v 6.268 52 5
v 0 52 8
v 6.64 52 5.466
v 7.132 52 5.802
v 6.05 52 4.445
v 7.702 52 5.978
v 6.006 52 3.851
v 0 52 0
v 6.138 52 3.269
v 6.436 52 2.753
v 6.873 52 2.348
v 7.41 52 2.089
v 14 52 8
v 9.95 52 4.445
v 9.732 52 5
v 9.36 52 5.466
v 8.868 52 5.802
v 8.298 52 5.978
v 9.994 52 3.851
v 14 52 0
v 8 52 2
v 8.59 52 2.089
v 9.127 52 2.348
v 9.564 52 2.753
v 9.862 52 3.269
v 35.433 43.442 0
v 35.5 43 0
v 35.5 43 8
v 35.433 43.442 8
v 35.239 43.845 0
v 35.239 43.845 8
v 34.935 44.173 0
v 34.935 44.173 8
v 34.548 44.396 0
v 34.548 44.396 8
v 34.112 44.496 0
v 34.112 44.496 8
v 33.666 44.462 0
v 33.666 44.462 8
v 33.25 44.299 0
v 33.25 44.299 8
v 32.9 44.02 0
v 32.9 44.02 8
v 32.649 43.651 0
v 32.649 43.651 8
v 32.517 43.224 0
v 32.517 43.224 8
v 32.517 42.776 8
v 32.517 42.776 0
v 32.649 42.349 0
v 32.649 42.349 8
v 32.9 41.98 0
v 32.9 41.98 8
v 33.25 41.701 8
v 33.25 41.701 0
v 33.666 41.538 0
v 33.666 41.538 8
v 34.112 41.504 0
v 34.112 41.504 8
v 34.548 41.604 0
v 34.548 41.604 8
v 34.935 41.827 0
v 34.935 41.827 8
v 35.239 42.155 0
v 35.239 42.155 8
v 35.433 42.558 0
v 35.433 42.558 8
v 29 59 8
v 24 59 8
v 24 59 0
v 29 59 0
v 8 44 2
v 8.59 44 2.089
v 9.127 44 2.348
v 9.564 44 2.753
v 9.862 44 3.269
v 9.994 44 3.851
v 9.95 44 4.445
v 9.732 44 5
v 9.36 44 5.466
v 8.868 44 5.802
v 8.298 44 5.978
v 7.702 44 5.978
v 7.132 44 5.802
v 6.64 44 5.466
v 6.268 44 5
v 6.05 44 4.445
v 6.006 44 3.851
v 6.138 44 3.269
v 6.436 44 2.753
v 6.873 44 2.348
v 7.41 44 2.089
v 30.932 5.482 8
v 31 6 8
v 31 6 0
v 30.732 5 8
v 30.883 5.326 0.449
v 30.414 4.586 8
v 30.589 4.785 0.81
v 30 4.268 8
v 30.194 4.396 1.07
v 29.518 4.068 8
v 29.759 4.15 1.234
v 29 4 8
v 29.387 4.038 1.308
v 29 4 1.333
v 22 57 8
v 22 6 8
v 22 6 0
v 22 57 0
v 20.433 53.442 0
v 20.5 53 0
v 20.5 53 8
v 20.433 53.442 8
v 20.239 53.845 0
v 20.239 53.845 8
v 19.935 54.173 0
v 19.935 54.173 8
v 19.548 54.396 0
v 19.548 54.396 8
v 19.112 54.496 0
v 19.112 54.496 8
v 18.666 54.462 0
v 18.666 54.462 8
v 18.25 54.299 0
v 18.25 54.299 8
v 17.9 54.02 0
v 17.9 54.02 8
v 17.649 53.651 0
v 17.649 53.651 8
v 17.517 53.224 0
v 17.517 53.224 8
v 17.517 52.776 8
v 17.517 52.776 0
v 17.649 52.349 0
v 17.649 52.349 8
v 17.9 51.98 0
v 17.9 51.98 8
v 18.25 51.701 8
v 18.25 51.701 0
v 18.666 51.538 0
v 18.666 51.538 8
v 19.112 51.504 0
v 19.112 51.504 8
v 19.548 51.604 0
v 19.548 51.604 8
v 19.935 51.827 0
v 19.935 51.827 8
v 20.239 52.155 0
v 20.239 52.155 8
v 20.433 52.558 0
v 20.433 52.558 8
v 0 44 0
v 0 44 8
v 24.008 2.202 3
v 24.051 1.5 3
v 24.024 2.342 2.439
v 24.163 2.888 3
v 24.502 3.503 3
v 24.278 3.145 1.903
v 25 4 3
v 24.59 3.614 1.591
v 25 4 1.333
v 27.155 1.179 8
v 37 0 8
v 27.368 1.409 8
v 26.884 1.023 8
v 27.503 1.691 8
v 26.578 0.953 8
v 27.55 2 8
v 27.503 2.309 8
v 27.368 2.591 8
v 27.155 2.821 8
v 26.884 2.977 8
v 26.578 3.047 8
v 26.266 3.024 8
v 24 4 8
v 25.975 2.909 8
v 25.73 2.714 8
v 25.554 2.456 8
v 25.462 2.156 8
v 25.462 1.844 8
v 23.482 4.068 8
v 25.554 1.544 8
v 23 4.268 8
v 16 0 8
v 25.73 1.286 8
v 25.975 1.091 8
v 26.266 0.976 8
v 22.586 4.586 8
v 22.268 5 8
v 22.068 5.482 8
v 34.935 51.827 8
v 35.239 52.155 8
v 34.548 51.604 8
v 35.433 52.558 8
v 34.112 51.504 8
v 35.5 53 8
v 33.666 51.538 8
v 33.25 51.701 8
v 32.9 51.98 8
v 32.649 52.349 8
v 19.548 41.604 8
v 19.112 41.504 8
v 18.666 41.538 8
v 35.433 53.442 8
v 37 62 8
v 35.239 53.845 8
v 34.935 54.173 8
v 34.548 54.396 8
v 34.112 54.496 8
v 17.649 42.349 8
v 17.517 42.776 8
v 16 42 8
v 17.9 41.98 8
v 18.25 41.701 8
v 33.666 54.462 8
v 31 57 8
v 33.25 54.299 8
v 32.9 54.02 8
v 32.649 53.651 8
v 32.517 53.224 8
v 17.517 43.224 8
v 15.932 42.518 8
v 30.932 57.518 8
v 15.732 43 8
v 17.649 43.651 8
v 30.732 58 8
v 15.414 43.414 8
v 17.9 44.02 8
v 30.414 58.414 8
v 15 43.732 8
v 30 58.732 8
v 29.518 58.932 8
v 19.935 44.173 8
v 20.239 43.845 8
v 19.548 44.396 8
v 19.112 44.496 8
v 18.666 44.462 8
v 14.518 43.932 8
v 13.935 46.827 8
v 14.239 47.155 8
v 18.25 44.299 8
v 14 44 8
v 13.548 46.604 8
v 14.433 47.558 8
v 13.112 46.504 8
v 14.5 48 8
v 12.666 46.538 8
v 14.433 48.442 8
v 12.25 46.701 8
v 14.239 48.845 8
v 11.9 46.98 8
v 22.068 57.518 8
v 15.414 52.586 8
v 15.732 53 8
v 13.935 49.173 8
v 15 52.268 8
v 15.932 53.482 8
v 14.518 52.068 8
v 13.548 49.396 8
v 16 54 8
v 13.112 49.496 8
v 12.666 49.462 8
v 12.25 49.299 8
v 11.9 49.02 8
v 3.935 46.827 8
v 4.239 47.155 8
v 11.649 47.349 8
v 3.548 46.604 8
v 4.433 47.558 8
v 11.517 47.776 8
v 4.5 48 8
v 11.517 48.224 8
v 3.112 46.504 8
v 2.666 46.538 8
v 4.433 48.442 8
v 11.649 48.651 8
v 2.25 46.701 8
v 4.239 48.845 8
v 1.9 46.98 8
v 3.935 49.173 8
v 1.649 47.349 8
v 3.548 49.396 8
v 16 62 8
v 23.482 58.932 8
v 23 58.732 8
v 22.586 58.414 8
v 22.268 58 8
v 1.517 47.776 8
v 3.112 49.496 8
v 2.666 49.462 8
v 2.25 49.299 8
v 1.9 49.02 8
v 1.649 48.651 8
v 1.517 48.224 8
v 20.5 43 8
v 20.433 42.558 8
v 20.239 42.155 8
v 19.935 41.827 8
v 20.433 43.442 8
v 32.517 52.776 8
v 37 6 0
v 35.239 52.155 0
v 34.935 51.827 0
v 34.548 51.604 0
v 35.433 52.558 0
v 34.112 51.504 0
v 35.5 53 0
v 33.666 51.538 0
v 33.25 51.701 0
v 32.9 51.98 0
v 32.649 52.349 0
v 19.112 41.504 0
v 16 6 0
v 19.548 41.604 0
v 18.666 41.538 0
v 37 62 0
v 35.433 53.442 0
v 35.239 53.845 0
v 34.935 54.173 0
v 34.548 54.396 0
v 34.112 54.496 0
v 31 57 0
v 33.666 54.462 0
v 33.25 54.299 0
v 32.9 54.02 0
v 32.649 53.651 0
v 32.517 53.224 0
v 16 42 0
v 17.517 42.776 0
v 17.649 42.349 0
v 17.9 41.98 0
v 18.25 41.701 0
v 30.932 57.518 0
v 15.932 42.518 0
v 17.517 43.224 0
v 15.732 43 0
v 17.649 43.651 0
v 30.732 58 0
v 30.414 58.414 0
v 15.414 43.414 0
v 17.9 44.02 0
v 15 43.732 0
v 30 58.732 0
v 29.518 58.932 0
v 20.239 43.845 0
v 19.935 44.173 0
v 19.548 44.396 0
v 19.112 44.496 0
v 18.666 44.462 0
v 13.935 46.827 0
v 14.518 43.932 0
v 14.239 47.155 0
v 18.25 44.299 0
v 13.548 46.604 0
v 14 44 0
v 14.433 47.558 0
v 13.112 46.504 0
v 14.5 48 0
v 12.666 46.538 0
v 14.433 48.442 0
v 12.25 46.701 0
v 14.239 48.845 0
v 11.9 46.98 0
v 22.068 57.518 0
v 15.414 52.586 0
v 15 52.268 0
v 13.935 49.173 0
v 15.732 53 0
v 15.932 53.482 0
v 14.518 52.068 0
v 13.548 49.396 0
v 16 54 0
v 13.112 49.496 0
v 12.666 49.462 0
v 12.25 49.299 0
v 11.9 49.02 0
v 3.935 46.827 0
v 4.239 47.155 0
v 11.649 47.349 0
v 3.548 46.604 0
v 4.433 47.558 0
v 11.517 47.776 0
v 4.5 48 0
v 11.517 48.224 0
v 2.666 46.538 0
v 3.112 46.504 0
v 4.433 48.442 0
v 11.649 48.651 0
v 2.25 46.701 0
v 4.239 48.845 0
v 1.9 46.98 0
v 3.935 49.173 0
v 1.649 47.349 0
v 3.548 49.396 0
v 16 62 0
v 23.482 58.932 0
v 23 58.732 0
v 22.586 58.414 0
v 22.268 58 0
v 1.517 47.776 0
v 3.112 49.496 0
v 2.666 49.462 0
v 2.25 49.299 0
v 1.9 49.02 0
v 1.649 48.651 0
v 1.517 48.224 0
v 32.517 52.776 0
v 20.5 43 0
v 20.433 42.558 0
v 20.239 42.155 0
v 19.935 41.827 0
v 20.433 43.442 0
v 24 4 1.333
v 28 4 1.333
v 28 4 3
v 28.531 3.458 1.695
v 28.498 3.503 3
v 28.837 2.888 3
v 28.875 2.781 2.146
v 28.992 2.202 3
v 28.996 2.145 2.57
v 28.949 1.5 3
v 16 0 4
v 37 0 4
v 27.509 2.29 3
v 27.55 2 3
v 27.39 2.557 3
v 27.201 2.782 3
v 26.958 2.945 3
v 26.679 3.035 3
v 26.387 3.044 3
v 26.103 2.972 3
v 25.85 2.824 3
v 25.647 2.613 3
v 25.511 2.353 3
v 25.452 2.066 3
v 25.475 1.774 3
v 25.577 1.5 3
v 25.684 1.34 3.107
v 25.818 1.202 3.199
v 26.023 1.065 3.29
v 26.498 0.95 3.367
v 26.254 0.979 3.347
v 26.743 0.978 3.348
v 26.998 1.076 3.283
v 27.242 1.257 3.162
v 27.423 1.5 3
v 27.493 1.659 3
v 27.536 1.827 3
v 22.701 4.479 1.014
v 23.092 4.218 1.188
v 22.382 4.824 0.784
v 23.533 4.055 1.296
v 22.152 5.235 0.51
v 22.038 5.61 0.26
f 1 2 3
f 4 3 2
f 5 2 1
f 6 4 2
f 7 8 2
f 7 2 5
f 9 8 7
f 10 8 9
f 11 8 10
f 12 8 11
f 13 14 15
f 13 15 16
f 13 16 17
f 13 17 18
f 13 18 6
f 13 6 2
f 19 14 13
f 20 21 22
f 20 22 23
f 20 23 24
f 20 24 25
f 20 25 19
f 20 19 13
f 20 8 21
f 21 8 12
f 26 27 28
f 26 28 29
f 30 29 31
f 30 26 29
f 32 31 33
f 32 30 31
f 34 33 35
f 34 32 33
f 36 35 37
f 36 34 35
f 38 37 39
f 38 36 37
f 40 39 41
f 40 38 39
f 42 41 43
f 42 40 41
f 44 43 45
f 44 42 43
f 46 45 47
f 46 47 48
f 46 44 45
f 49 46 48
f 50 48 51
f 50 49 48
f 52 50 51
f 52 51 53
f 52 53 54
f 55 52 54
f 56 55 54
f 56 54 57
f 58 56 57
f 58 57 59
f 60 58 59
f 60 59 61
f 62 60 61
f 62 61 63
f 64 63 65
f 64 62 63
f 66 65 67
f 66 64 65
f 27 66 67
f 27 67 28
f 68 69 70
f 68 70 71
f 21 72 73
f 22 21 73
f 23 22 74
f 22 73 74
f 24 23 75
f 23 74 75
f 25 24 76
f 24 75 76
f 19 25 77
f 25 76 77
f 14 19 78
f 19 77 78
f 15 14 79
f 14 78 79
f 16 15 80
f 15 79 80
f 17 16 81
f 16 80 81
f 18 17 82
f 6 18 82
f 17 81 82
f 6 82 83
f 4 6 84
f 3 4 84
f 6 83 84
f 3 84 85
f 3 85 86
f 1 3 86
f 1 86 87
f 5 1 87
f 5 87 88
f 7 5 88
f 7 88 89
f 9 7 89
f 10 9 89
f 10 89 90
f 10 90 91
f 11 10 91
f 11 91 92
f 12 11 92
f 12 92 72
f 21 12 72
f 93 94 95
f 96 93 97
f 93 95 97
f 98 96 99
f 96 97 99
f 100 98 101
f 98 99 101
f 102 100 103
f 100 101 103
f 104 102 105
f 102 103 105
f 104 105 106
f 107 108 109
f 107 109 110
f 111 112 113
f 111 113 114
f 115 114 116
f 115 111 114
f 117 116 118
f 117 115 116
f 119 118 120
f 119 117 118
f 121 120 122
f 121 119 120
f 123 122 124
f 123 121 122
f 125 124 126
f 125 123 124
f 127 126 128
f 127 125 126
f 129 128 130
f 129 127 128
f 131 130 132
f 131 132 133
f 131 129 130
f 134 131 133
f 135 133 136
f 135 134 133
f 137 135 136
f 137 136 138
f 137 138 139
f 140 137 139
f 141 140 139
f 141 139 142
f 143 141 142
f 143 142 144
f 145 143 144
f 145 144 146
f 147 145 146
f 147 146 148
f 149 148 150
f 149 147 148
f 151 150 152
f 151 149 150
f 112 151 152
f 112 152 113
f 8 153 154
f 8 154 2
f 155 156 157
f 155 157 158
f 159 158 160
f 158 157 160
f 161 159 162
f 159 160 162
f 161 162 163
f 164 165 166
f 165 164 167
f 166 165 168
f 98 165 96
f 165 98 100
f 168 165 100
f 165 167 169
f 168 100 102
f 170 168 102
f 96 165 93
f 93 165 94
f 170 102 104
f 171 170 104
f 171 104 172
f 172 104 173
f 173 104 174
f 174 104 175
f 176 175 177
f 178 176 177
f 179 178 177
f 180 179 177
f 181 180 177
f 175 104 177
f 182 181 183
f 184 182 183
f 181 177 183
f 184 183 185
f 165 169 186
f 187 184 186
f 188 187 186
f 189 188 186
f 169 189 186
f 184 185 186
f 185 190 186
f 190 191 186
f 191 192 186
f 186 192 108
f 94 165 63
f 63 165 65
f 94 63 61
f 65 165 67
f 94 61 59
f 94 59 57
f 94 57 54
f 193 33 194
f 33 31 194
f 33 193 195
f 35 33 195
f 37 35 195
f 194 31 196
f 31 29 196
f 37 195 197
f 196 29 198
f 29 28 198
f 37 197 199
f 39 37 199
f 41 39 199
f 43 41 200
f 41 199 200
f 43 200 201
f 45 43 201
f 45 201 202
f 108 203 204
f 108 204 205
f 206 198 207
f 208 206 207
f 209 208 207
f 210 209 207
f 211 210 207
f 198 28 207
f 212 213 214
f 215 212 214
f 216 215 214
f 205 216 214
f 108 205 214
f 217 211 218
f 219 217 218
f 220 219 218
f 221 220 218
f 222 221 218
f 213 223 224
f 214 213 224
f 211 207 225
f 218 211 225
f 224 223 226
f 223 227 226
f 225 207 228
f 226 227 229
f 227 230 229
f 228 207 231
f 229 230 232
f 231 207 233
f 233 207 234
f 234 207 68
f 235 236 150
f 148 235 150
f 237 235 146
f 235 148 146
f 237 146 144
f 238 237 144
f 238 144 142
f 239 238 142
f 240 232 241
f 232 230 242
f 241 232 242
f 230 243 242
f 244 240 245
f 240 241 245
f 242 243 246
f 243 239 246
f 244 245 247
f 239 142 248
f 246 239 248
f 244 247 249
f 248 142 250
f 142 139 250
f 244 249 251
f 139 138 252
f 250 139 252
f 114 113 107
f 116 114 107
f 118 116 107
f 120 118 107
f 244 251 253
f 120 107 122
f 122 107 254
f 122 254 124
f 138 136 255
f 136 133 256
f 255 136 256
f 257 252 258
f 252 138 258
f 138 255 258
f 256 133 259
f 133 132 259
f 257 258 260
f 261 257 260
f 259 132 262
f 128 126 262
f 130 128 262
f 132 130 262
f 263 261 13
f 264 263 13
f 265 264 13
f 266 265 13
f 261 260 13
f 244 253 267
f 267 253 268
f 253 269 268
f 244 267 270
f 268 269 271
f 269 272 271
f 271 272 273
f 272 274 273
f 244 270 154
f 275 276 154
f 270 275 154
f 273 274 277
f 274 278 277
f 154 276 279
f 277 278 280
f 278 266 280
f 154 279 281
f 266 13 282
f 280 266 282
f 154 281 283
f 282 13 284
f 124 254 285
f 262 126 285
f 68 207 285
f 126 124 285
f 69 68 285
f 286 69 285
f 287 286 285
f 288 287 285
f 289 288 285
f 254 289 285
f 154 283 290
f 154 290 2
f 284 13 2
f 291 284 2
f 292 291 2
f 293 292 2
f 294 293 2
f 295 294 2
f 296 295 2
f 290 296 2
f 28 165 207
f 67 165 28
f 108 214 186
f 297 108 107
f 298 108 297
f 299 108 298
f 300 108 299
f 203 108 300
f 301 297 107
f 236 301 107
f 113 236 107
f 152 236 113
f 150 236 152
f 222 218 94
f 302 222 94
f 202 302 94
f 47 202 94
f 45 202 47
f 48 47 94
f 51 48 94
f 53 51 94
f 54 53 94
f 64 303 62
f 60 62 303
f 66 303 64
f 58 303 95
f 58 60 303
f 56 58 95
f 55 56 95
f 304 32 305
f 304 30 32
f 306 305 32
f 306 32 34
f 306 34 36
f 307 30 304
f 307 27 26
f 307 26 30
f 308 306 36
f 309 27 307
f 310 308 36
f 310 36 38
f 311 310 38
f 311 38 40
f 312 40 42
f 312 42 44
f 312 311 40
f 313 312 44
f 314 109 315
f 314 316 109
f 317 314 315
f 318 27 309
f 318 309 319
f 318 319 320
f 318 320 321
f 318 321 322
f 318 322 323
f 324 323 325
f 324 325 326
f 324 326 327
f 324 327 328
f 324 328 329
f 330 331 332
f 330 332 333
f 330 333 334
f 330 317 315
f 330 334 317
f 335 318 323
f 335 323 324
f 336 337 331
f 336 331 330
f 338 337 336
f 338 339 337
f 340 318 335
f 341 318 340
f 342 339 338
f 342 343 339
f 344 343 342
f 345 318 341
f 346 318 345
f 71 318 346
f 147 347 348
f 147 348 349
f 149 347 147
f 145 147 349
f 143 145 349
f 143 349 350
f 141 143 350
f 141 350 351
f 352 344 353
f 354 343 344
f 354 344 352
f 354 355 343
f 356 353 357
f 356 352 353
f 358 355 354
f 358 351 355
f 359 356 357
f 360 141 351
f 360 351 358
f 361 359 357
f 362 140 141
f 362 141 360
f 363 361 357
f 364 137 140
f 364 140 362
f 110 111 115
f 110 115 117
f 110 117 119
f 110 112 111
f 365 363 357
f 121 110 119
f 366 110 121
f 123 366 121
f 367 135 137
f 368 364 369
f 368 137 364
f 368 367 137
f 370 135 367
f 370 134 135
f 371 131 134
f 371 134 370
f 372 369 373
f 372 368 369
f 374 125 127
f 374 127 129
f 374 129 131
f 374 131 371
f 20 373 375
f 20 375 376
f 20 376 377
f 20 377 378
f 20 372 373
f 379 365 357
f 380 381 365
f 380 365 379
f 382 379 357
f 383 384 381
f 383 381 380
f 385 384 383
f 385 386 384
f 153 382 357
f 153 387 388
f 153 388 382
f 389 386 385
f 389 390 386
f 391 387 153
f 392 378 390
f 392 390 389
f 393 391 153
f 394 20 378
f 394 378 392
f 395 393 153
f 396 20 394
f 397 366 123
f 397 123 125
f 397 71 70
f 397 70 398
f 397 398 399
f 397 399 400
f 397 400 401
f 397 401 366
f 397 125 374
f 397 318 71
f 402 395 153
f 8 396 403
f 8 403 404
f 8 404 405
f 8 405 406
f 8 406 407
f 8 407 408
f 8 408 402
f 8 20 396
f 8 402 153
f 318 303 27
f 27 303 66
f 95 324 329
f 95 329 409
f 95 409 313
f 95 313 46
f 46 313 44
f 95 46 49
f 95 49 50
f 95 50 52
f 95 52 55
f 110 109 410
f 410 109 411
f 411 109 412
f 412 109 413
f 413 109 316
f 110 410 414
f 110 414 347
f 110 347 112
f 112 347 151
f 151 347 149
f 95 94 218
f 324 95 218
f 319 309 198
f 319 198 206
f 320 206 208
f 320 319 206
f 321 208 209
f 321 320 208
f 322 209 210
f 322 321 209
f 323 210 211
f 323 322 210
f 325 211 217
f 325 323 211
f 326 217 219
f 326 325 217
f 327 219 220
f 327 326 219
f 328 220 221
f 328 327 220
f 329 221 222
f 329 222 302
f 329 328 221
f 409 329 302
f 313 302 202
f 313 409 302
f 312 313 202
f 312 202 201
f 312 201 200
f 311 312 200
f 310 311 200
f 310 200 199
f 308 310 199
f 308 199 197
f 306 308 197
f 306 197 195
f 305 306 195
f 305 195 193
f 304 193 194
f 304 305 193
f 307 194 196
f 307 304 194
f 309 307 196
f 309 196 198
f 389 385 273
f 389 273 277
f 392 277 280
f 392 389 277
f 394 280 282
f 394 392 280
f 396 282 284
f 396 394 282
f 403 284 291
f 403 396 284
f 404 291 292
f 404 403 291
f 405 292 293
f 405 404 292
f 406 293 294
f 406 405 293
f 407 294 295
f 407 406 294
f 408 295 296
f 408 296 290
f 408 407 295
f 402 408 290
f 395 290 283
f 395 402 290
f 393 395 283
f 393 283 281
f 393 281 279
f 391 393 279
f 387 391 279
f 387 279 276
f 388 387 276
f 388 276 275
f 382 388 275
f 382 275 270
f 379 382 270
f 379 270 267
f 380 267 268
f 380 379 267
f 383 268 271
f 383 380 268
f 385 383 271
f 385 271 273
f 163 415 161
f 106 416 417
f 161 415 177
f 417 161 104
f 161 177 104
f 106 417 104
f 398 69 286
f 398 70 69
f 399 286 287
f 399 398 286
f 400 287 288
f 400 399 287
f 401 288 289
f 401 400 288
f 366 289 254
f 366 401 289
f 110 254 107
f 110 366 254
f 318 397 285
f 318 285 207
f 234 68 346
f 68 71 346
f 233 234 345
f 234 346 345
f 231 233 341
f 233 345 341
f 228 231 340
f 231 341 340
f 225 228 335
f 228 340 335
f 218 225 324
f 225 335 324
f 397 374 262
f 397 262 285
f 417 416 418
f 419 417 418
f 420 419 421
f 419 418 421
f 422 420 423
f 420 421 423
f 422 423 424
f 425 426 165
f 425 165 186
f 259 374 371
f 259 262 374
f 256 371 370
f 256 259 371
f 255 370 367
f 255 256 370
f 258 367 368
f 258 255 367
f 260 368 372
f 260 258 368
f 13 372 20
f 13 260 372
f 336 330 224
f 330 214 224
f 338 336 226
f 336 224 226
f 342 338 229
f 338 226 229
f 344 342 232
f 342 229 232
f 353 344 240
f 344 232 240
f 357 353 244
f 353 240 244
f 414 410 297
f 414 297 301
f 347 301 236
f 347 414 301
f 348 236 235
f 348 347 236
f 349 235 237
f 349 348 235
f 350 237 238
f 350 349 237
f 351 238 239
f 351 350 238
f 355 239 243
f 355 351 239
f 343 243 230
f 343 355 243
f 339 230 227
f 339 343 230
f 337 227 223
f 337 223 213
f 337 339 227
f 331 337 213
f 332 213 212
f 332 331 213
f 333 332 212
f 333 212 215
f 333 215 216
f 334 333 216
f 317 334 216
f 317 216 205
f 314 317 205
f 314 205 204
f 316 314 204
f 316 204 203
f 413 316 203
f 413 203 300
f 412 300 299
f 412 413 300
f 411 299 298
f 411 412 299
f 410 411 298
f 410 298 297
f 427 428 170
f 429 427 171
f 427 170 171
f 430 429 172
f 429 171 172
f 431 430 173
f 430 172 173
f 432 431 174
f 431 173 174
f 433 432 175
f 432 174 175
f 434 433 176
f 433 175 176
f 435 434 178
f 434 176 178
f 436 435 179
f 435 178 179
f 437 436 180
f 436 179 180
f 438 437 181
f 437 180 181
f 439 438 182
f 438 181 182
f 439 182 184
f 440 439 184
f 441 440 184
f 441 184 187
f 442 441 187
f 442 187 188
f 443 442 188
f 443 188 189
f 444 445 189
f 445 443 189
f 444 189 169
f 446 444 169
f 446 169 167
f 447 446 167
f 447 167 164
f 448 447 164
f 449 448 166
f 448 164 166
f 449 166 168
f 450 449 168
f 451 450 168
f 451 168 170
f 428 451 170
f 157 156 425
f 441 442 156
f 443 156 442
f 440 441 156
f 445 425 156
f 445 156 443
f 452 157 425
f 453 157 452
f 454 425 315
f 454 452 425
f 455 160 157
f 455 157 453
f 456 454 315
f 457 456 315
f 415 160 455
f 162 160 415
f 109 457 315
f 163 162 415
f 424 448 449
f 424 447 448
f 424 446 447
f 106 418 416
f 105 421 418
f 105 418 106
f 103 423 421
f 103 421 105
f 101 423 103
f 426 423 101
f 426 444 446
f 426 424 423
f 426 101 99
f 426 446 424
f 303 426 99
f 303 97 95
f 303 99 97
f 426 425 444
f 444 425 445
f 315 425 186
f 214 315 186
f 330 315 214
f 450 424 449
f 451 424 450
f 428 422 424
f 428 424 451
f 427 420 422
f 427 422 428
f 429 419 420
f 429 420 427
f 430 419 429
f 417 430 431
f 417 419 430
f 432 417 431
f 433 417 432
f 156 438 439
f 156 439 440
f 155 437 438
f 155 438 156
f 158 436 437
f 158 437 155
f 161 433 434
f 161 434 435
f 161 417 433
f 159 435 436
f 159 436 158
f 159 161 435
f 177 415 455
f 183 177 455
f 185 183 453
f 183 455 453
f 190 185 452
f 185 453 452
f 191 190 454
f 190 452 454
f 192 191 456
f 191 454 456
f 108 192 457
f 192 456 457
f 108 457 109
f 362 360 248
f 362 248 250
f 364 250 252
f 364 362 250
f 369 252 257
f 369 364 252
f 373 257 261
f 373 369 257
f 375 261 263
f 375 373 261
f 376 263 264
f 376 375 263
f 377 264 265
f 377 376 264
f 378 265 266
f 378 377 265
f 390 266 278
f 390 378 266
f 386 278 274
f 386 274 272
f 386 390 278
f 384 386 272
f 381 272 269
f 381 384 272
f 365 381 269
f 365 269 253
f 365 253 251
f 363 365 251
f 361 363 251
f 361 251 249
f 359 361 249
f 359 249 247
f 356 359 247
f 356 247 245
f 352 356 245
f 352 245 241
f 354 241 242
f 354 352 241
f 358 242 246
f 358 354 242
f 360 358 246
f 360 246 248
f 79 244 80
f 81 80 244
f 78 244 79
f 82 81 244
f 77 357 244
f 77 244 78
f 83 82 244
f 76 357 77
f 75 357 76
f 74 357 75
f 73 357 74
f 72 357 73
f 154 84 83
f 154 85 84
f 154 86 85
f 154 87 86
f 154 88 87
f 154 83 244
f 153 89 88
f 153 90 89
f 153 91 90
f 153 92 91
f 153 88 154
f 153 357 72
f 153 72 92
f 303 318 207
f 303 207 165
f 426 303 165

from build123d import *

# Parameters (mm, degrees)
SKETCH_1_R          = 1.5
EXTRUDE_1_DEPTH     = 8
FILLET_1_R          = 2
SKETCH_2_W          = 9
SKETCH_2_H          = 55
CUT_EXTRUDE_1_DEPTH = 73.642962495
FILLET_2_R          = 2
SKETCH_3_R          = 2
CUT_EXTRUDE_2_DEPTH = 59.043087444
SKETCH_4_R          = 1.05
CUT_EXTRUDE_3_DEPTH = 73.642962495
SKETCH_5_R          = 2.5
CUT_EXTRUDE_4_DEPTH = 3
CUT_EXTRUDE_5_DEPTH = 22


with BuildPart() as part:
    # 草图1 → 凸台-拉伸1 (new body)
    with BuildSketch(Plane.XY):
        Polygon((37, 62), (37, 0), (16, 0), (16, 44), (0, 44), (0, 52), (16, 52), (16, 62), align=None)
        with Locations((19, 53)):
            Circle(SKETCH_1_R, mode=Mode.SUBTRACT)
        with Locations((34, 53)):
            Circle(SKETCH_1_R, mode=Mode.SUBTRACT)
        with Locations((19, 43)):
            Circle(SKETCH_1_R, mode=Mode.SUBTRACT)
        with Locations((34, 43)):
            Circle(SKETCH_1_R, mode=Mode.SUBTRACT)
        with Locations((3, 48)):
            Circle(SKETCH_1_R, mode=Mode.SUBTRACT)
        with Locations((13, 48)):
            Circle(SKETCH_1_R, mode=Mode.SUBTRACT)
    extrude(amount=EXTRUDE_1_DEPTH)

    # 圆角1
    fillet_1_edges = [part.edges().sort_by_distance(p)[0] for p in [
        (16, 52, 4),
        (16, 44, 4),
    ]]
    fillet(fillet_1_edges, radius=FILLET_1_R)

    # 草图2 → 切除-拉伸1 (cut, through all)
    with BuildSketch(Plane.XY.offset(8)):
        with Locations((26.5, 31.5)):
            Rectangle(SKETCH_2_W, SKETCH_2_H)
    extrude(amount=-CUT_EXTRUDE_1_DEPTH, mode=Mode.SUBTRACT)

    # 圆角2
    fillet_2_edges = [part.edges().sort_by_distance(p)[0] for p in [
        (31, 59, 4),
        (31, 4, 4),
        (22, 4, 4),
        (22, 59, 4),
    ]]
    fillet(fillet_2_edges, radius=FILLET_2_R)

    # 草图3 → 切除-拉伸2 (cut, through all)
    with BuildSketch(Plane.XZ.offset(-44)):
        with Locations(Location((8, 4, 0), (0, 0, 270))):
            Circle(SKETCH_3_R)
    extrude(amount=-CUT_EXTRUDE_2_DEPTH, mode=Mode.SUBTRACT)

    # 草图4 → 切除-拉伸3 (cut, through all)
    with BuildSketch(Plane.XY.offset(8)):
        with Locations((26.5, 2)):
            Circle(SKETCH_4_R)
    extrude(amount=-CUT_EXTRUDE_3_DEPTH, mode=Mode.SUBTRACT)

    # 草图5 → 切除-拉伸4 (cut)
    with BuildSketch(Plane(origin=(0, 0, 0), x_dir=(-1, 0, 0), z_dir=(0, 0, -1))):
        with Locations((-26.5, 2)):
            Circle(SKETCH_5_R)
    extrude(amount=-CUT_EXTRUDE_4_DEPTH, mode=Mode.SUBTRACT)

    # 草图6 → 切除-拉伸5 (cut)
    with BuildSketch(Plane(origin=(37, 0, 0), x_dir=(0, 0, -1), z_dir=(1, 0, 0))):
        Polygon((-4, 0), (0, 6), (0, 0), align=None)
    extrude(amount=-CUT_EXTRUDE_5_DEPTH, mode=Mode.SUBTRACT)


solid = part.part
